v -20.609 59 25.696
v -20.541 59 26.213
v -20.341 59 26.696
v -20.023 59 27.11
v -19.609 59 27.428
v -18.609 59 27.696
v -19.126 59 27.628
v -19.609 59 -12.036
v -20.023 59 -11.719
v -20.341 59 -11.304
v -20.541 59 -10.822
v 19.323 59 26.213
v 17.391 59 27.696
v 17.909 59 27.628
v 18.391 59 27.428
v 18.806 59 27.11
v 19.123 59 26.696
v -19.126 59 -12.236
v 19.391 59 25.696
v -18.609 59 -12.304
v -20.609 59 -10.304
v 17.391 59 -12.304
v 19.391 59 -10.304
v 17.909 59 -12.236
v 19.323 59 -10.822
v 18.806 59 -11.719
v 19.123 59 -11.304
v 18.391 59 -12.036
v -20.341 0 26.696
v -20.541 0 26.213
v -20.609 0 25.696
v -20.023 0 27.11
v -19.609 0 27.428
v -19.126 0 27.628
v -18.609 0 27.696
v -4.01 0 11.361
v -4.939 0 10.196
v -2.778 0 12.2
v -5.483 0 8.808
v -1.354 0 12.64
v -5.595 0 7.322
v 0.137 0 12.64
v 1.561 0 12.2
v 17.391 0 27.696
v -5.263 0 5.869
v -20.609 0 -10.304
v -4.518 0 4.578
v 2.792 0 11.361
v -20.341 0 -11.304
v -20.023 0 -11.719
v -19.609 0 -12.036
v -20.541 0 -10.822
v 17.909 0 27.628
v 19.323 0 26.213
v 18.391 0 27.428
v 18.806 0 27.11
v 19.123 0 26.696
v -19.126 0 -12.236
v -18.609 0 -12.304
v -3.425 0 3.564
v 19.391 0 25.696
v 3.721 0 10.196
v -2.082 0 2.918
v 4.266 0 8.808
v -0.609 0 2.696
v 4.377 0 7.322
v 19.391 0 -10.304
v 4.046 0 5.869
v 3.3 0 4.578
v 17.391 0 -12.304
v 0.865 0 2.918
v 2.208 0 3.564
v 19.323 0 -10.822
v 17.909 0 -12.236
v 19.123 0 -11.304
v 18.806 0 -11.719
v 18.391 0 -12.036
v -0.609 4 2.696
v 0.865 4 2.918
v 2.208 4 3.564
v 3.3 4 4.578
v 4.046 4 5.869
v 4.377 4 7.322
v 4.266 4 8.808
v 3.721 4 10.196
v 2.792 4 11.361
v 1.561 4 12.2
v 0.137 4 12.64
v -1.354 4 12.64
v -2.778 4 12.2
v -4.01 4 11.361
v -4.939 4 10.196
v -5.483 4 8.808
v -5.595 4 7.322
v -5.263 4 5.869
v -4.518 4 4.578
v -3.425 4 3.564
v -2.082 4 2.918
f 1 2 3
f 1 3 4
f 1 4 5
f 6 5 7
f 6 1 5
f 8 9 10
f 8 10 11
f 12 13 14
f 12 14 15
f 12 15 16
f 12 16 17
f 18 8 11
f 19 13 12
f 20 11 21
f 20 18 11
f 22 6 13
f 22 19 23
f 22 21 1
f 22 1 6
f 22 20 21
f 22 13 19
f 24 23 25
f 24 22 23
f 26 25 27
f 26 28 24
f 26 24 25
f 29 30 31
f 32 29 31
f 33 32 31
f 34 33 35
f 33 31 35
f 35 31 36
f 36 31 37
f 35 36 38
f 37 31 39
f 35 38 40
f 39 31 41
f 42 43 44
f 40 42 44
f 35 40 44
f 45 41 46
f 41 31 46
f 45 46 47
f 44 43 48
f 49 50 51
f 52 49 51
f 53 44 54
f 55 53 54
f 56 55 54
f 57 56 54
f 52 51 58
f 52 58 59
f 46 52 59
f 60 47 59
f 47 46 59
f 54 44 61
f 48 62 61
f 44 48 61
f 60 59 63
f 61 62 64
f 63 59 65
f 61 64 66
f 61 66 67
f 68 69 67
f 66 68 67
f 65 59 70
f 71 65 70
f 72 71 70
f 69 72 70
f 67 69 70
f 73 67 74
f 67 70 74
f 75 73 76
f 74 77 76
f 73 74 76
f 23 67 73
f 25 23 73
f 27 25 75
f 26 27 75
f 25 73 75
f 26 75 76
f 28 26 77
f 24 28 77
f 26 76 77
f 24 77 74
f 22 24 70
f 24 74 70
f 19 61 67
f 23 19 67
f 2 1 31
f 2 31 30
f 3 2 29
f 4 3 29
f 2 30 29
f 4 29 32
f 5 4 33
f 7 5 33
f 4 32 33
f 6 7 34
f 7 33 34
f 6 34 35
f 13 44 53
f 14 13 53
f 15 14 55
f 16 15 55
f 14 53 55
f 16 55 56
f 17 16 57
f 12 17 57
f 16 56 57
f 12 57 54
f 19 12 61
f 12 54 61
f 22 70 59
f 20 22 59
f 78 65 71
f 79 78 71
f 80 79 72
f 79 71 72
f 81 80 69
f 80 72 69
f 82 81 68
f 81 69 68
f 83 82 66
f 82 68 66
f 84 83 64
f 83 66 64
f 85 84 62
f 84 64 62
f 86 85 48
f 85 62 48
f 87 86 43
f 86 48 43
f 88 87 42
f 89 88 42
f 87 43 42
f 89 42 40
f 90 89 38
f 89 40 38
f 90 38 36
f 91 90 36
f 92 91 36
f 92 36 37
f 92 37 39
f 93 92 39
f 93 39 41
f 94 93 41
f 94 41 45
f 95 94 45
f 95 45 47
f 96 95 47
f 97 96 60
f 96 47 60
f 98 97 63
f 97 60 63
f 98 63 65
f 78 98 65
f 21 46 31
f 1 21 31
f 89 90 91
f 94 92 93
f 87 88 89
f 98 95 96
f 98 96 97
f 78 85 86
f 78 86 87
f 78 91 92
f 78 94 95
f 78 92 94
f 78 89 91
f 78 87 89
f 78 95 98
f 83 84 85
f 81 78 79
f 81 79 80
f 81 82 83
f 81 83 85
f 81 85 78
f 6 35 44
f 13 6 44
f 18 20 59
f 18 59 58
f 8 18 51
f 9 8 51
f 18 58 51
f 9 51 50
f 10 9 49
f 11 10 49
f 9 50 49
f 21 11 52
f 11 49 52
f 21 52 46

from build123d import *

# Parameters (mm, degrees)
BOSS_EXTRUDE1_DEPTH = 59
SKETCH2_R           = 5
CUT_EXTRUDE1_DEPTH  = 4


with BuildPart() as part:
    # Sketch1 → Boss-Extrude1 (new body)
    with BuildSketch(Plane(origin=(0, 0, 0), x_dir=(1, 0, 0), z_dir=(0, 1, 0))):
        with BuildLine():
            Line((-18.608695652, -27.695652174), (17.391304348, -27.695652174))
            ThreePointArc((17.391304348, -27.695652174), (18.80551791, -27.109865736), (19.391304348, -25.695652174))
            Line((19.391304348, -25.695652174), (19.391304348, 10.304347826))
            ThreePointArc((19.391304348, 10.304347826), (18.80551791, 11.718561388), (17.391304348, 12.304347826))
            Line((17.391304348, 12.304347826), (-18.608695652, 12.304347826))
            ThreePointArc((-18.608695652, 12.304347826), (-20.022909215, 11.718561388), (-20.608695652, 10.304347826))
            Line((-20.608695652, 10.304347826), (-20.608695652, -25.695652174))
            ThreePointArc((-20.608695652, -25.695652174), (-20.022909215, -27.109865736), (-18.608695652, -27.695652174))
        make_face()
    extrude(amount=BOSS_EXTRUDE1_DEPTH)

    # Sketch2 → Cut-Extrude1 (cut)
    with BuildSketch(Plane.XZ):
        with Locations(Location((-0.608695652, 7.695652174, 0), (0, 0, 270))):
            Circle(SKETCH2_R)
    extrude(amount=-CUT_EXTRUDE1_DEPTH, mode=Mode.SUBTRACT)


solid = part.part
